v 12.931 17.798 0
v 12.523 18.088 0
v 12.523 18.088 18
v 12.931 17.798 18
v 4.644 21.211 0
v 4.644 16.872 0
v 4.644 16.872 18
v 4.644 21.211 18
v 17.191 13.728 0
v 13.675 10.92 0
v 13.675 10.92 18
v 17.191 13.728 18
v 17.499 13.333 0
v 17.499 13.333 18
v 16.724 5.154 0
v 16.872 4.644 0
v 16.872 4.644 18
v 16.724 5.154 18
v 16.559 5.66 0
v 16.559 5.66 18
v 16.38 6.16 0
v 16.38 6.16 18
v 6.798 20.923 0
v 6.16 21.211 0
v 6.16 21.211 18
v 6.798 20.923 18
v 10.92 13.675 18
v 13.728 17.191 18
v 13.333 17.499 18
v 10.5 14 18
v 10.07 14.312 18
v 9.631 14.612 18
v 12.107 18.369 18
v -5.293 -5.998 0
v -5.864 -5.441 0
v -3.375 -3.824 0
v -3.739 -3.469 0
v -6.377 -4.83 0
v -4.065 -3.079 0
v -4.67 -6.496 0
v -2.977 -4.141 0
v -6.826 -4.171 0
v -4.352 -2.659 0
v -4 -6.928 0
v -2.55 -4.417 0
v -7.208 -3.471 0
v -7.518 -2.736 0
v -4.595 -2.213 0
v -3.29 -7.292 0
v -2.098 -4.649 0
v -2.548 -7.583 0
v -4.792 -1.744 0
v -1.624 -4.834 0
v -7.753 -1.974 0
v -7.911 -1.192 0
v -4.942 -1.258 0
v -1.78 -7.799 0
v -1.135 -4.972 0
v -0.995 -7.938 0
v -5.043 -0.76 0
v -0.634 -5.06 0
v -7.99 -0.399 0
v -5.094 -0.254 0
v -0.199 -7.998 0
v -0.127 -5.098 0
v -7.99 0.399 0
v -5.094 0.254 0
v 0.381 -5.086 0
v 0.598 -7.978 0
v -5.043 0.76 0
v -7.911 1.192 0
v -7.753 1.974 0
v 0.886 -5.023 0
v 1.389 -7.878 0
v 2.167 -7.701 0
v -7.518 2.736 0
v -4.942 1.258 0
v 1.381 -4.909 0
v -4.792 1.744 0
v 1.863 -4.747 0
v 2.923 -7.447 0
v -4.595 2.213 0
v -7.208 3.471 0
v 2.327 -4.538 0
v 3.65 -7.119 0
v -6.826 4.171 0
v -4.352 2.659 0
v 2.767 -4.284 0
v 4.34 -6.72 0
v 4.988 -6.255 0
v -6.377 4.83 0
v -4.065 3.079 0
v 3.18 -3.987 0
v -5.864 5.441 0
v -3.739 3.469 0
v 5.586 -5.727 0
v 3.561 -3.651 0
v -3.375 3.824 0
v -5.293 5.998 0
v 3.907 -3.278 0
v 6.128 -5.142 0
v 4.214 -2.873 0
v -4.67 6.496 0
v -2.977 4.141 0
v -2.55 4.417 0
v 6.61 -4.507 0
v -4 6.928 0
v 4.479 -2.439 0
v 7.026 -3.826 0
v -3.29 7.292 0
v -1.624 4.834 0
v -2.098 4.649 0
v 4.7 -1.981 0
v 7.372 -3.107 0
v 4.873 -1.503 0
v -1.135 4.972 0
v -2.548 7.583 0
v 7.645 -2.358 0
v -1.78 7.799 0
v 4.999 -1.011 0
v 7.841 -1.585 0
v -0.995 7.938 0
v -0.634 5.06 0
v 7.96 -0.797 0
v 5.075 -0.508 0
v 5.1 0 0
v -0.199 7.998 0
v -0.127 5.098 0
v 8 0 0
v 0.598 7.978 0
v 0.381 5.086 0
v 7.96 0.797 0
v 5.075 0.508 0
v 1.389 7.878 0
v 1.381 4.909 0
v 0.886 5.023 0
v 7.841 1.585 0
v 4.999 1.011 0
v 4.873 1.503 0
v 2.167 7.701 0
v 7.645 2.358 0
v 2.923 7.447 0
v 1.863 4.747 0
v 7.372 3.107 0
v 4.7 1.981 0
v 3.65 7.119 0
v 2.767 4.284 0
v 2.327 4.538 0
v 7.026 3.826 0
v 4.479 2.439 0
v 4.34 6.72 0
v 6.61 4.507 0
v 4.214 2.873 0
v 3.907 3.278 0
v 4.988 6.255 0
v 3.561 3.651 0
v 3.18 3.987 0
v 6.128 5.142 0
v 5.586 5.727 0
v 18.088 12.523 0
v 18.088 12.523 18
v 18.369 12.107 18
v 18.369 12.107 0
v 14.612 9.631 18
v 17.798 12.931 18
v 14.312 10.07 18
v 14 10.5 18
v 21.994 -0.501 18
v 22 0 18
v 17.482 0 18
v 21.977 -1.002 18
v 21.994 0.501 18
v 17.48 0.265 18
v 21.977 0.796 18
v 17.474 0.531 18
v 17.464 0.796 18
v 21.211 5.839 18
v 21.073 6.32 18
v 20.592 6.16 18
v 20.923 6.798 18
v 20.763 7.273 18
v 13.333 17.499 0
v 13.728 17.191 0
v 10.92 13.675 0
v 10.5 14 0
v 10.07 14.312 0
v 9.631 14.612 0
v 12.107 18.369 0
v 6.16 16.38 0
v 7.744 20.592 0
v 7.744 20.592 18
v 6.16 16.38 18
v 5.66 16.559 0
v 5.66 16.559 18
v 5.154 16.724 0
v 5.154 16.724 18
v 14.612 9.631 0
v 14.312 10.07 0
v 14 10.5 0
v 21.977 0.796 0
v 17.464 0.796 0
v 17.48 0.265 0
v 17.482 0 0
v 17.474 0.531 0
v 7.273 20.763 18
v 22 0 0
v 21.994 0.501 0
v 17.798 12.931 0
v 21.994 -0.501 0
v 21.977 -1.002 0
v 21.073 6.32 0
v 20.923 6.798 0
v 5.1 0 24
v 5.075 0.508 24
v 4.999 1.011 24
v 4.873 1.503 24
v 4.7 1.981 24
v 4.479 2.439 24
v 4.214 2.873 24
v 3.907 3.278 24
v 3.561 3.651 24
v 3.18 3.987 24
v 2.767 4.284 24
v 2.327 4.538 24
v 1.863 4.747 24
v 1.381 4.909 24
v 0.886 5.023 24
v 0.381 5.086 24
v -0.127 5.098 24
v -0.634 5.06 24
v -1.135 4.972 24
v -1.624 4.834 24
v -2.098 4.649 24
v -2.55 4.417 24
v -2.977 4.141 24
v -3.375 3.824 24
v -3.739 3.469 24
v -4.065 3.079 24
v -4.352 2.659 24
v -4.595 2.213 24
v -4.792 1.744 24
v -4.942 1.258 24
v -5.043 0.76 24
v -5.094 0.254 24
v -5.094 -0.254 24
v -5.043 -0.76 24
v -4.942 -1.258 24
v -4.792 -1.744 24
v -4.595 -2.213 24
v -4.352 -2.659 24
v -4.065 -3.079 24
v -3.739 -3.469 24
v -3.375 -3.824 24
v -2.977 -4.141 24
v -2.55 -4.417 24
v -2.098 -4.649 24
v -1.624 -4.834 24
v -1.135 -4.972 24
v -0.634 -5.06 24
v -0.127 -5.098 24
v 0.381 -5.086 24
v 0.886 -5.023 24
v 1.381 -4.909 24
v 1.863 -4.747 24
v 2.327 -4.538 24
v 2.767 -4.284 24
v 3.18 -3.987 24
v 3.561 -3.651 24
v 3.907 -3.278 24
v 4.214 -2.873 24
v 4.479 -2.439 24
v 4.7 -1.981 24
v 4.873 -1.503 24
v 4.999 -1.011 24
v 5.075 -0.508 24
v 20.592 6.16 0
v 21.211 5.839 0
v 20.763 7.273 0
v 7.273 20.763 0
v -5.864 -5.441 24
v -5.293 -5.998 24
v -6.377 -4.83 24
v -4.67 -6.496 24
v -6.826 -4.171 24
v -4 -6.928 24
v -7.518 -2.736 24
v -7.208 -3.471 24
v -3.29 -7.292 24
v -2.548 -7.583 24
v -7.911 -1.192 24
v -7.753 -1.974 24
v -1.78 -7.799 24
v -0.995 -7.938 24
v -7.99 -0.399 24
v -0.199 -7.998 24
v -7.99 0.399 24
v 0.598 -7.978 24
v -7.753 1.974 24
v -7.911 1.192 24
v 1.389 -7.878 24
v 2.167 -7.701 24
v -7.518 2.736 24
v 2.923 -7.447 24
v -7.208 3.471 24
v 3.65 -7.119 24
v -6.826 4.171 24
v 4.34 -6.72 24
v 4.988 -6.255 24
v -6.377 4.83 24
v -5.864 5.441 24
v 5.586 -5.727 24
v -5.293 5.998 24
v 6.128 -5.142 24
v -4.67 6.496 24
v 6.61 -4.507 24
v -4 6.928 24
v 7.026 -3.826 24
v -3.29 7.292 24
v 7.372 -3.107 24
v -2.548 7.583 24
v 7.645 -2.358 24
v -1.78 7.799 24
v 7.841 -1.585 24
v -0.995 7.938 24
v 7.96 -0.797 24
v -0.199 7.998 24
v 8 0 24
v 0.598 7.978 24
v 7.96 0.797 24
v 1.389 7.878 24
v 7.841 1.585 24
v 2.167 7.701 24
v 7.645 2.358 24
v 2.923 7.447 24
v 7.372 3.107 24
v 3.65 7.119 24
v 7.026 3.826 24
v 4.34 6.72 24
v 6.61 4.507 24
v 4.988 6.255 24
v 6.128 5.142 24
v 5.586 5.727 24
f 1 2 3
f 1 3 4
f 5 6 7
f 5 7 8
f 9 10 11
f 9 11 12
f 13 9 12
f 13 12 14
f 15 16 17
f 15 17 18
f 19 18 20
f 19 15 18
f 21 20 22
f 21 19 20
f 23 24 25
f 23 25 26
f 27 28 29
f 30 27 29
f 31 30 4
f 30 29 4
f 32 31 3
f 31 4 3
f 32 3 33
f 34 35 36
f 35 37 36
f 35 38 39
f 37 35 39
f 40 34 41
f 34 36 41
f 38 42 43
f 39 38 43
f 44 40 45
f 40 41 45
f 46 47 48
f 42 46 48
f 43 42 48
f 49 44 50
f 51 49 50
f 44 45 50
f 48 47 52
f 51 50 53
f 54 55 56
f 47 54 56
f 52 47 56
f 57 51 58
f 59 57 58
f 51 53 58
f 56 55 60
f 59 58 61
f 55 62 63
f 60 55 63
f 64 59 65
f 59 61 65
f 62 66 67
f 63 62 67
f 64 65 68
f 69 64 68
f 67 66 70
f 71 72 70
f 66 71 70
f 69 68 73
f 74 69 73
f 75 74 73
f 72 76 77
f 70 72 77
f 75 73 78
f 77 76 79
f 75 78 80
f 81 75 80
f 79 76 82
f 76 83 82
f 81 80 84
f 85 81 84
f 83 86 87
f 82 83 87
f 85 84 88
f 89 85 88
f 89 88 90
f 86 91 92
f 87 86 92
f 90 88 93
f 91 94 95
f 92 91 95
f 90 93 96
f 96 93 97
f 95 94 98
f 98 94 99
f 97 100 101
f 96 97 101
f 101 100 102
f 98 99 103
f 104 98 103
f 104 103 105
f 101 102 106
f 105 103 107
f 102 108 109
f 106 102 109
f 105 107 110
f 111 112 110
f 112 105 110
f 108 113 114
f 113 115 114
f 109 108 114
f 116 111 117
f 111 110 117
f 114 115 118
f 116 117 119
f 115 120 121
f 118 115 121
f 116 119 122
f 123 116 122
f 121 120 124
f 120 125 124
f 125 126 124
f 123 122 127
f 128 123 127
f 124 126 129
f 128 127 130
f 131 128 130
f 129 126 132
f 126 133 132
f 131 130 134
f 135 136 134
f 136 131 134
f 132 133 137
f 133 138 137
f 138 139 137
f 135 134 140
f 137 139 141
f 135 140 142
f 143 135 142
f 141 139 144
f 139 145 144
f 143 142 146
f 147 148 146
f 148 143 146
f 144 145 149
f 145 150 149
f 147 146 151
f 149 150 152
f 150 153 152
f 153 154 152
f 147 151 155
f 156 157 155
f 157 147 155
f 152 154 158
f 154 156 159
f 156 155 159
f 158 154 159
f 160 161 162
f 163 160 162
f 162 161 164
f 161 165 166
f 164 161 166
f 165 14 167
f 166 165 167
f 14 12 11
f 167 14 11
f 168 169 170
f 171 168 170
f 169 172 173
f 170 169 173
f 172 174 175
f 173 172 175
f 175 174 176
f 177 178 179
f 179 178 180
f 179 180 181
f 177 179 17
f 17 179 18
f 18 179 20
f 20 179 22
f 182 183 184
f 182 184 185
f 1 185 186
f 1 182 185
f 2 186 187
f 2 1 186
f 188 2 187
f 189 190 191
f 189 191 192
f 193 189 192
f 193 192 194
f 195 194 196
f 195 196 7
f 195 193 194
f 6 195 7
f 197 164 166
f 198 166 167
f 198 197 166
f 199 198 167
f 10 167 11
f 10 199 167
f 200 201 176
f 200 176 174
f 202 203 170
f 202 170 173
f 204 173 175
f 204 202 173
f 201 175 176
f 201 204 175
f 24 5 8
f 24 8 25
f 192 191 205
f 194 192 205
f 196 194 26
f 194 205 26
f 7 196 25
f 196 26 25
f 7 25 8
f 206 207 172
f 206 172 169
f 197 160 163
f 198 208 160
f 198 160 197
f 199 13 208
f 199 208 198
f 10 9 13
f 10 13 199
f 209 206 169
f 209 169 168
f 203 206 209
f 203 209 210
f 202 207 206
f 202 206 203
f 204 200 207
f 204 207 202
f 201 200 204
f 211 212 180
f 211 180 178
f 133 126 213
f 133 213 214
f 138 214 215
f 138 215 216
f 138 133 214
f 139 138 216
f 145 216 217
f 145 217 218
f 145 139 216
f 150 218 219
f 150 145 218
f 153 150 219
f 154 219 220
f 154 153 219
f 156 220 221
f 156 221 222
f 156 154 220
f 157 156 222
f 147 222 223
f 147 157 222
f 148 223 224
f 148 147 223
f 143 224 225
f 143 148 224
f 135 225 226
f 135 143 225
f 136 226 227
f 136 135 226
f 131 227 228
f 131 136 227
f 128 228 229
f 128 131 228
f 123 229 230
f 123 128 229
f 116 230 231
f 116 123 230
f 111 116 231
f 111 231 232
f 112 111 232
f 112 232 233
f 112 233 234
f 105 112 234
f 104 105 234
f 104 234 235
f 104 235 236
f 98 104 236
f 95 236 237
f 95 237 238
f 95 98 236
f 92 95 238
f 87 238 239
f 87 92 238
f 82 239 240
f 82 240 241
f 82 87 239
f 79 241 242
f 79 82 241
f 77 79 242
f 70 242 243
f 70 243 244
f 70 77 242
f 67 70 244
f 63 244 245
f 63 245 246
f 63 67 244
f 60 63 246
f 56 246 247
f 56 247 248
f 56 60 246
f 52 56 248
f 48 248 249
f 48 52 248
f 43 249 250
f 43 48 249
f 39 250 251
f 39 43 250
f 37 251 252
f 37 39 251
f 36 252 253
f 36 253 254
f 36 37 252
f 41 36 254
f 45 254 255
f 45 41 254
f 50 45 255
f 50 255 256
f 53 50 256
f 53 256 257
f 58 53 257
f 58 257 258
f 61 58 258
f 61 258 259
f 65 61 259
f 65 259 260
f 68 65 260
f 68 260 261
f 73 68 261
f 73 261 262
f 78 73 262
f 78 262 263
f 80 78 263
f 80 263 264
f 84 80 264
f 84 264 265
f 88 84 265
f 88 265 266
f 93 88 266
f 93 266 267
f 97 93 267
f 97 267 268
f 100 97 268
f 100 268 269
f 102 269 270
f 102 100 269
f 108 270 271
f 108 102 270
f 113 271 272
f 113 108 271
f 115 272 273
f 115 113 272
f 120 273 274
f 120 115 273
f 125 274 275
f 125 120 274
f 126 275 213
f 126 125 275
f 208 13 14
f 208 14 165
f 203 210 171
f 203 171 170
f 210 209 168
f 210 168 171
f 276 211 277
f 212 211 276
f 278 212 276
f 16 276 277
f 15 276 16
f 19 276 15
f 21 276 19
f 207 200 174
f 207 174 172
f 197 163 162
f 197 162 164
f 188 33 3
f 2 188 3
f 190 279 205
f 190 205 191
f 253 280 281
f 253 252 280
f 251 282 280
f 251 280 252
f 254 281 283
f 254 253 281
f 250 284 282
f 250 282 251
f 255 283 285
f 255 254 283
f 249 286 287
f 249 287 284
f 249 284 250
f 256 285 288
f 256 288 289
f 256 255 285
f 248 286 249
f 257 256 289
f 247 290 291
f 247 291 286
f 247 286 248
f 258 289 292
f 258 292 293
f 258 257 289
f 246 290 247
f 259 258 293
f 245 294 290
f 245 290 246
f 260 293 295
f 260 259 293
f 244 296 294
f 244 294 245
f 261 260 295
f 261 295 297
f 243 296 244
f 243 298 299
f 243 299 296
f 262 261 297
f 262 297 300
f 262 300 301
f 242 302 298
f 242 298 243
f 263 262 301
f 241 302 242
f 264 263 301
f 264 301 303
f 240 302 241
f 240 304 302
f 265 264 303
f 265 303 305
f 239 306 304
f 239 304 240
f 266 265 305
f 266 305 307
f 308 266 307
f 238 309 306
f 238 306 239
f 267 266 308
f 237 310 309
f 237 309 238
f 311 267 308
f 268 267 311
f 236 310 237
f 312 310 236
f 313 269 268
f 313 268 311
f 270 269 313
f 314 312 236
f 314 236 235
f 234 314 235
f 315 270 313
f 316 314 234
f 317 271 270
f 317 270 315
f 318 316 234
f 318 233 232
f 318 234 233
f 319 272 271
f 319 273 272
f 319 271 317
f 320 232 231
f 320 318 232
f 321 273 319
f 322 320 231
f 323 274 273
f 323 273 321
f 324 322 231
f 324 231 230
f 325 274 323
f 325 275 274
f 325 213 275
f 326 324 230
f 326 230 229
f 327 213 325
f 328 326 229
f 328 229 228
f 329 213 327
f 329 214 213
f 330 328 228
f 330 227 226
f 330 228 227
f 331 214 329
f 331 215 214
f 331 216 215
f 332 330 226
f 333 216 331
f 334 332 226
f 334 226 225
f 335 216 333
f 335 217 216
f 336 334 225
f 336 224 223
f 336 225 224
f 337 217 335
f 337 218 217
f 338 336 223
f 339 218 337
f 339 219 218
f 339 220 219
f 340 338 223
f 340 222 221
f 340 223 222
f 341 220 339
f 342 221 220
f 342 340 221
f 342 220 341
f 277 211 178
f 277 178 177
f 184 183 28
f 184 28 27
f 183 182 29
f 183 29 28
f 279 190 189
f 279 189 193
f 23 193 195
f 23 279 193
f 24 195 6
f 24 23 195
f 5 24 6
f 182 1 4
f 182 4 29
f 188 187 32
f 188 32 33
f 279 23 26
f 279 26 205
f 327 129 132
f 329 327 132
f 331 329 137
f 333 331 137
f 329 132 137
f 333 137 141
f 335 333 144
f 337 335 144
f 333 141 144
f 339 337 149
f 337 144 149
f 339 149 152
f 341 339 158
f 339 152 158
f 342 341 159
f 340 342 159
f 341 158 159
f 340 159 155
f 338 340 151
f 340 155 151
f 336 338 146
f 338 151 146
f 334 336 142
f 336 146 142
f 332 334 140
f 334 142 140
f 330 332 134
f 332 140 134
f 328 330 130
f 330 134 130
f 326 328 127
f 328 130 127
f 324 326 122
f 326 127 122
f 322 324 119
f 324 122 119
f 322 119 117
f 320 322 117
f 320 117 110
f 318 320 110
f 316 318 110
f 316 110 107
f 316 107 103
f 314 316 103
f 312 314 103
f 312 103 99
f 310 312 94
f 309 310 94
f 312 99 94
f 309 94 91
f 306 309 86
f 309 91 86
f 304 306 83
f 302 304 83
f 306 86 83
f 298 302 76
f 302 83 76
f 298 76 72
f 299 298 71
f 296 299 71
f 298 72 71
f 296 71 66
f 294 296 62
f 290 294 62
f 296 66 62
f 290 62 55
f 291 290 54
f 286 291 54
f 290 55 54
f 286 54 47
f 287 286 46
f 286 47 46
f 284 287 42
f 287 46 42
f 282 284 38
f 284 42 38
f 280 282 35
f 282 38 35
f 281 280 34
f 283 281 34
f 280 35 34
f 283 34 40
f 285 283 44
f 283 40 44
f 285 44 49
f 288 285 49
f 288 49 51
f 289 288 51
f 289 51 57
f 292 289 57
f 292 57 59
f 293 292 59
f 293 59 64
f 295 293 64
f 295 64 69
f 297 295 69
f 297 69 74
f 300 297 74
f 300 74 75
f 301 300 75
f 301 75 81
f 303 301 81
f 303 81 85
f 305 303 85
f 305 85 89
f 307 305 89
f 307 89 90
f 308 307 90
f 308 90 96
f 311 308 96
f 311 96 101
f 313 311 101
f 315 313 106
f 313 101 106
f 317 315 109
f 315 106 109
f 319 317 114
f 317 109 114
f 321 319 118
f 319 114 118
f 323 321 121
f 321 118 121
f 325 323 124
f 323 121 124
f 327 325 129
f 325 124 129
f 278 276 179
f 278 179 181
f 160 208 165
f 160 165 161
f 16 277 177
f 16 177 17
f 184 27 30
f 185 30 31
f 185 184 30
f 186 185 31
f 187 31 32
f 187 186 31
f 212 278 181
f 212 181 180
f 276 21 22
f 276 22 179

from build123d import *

# Parameters (mm, degrees)
SKETCH_1_R      = 8
SKETCH_1_R_2    = 5.1
EXTRUDE_1_DEPTH = 24
SKETCH_1_2_R    = 8
SKETCH_1_2_R_2  = 5.1
EXTRUDE_2_DEPTH = 24
EXTRUDE_3_DEPTH = 18
EXTRUDE_4_DEPTH = 18
EXTRUDE_5_DEPTH = 18
EXTRUDE_6_DEPTH = 18
EXTRUDE_7_DEPTH = 18


with BuildPart() as part:
    # 草图1 → 凸台-拉伸1 (new body)
    with BuildSketch(Plane.XY):
        Circle(SKETCH_1_R)
        Circle(SKETCH_1_R_2, mode=Mode.SUBTRACT)
    extrude(amount=EXTRUDE_1_DEPTH)

    # 草图1<2> → 凸台-拉伸2 (add)
    with BuildSketch(Plane.XY):
        Circle(SKETCH_1_2_R)
        Circle(SKETCH_1_2_R_2, mode=Mode.SUBTRACT)
    extrude(amount=EXTRUDE_2_DEPTH)


with BuildPart() as body_2:
    # 草图2 → 凸台-拉伸3 (new body)
    with BuildSketch(Plane.XY):
        with BuildLine():
            Line((17.463711136, 0.796076784), (21.977178019, 0.796076784))
            Line((21.977178019, 0.796076784), (21.994293765, 0.501040705))
            Line((21.994293765, 0.501040705), (22, 0))
            Line((22, 0), (21.994293765, -0.501040705))
            Line((21.994293765, -0.501040705), (21.977178019, -1.001821495))
            Line((21.977178019, -1.001821495), (17.481846152, 0))
            ThreePointArc((17.481846152, 0), (17.47731181, 0.39814166), (17.463711136, 0.796076784))
        make_face()
    extrude(amount=EXTRUDE_3_DEPTH)


with BuildPart() as body_3:
    # 草图3 → 凸台-拉伸4 (new body)
    with BuildSketch(Plane.XY):
        with BuildLine():
            Line((16.379966987, 6.160087784), (20.591958498, 6.160087784))
            Line((20.591958498, 6.160087784), (20.762986314, 7.27312858))
            Line((20.762986314, 7.27312858), (20.923243358, 6.798373876))
            Line((20.923243358, 6.798373876), (21.072646499, 6.320092525))
            Line((21.072646499, 6.320092525), (21.211118232, 5.838532635))
            Line((21.211118232, 5.838532635), (16.872480412, 4.644287323))
            ThreePointArc((16.872480412, 4.644287323), (16.643489035, 5.407797402), (16.379966987, 6.160087784))
        make_face()
    extrude(amount=EXTRUDE_4_DEPTH)


with BuildPart() as body_4:
    # 草图4 → 凸台-拉伸5 (new body)
    with BuildSketch(Plane.XY):
        with BuildLine():
            Line((13.674702527, 10.920279795), (17.191054606, 13.728351742))
            Line((17.191054606, 13.728351742), (17.499253098, 13.333271955))
            Line((17.499253098, 13.333271955), (17.798373876, 12.93127555))
            Line((17.798373876, 12.93127555), (18.088261772, 12.522571065))
            Line((18.088261772, 12.522571065), (18.368766406, 12.107370512))
            Line((18.368766406, 12.107370512), (14.611518732, 9.630862907))
            ThreePointArc((14.611518732, 9.630862907), (14.157797402, 10.286241915), (13.674702527, 10.920279795))
        make_face()
    extrude(amount=EXTRUDE_5_DEPTH)


with BuildPart() as body_5:
    # 草图5 → 凸台-拉伸6 (new body)
    with BuildSketch(Plane.XY):
        with BuildLine():
            Line((9.630862907, 14.611518732), (12.107370512, 18.368766406))
            Line((12.107370512, 18.368766406), (12.522571065, 18.088261772))
            Line((12.522571065, 18.088261772), (12.93127555, 17.798373876))
            Line((12.93127555, 17.798373876), (13.333271955, 17.499253098))
            Line((13.333271955, 17.499253098), (13.728351742, 17.191054606))
            Line((13.728351742, 17.191054606), (10.920279795, 13.674702527))
            ThreePointArc((10.920279795, 13.674702527), (10.286241915, 14.157797402), (9.630862907, 14.611518732))
        make_face()
    extrude(amount=EXTRUDE_6_DEPTH)


with BuildPart() as body_6:
    # 草图6 → 凸台-拉伸7 (new body)
    with BuildSketch(Plane.XY):
        with BuildLine():
            Line((4.644287323, 16.872480412), (4.644287323, 21.211118232))
            Line((4.644287323, 21.211118232), (6.160087784, 21.211118232))
            Line((6.160087784, 21.211118232), (6.798373876, 20.923243358))
            Line((6.798373876, 20.923243358), (7.27312858, 20.762986314))
            Line((7.27312858, 20.762986314), (7.744110358, 20.591958498))
            Line((7.744110358, 20.591958498), (6.160087784, 16.379966987))
            ThreePointArc((6.160087784, 16.379966987), (5.407797402, 16.643489035), (4.644287323, 16.872480412))
        make_face()
    extrude(amount=EXTRUDE_7_DEPTH)


solid = Compound([part.part, body_2.part, body_3.part, body_4.part, body_5.part, body_6.part])
